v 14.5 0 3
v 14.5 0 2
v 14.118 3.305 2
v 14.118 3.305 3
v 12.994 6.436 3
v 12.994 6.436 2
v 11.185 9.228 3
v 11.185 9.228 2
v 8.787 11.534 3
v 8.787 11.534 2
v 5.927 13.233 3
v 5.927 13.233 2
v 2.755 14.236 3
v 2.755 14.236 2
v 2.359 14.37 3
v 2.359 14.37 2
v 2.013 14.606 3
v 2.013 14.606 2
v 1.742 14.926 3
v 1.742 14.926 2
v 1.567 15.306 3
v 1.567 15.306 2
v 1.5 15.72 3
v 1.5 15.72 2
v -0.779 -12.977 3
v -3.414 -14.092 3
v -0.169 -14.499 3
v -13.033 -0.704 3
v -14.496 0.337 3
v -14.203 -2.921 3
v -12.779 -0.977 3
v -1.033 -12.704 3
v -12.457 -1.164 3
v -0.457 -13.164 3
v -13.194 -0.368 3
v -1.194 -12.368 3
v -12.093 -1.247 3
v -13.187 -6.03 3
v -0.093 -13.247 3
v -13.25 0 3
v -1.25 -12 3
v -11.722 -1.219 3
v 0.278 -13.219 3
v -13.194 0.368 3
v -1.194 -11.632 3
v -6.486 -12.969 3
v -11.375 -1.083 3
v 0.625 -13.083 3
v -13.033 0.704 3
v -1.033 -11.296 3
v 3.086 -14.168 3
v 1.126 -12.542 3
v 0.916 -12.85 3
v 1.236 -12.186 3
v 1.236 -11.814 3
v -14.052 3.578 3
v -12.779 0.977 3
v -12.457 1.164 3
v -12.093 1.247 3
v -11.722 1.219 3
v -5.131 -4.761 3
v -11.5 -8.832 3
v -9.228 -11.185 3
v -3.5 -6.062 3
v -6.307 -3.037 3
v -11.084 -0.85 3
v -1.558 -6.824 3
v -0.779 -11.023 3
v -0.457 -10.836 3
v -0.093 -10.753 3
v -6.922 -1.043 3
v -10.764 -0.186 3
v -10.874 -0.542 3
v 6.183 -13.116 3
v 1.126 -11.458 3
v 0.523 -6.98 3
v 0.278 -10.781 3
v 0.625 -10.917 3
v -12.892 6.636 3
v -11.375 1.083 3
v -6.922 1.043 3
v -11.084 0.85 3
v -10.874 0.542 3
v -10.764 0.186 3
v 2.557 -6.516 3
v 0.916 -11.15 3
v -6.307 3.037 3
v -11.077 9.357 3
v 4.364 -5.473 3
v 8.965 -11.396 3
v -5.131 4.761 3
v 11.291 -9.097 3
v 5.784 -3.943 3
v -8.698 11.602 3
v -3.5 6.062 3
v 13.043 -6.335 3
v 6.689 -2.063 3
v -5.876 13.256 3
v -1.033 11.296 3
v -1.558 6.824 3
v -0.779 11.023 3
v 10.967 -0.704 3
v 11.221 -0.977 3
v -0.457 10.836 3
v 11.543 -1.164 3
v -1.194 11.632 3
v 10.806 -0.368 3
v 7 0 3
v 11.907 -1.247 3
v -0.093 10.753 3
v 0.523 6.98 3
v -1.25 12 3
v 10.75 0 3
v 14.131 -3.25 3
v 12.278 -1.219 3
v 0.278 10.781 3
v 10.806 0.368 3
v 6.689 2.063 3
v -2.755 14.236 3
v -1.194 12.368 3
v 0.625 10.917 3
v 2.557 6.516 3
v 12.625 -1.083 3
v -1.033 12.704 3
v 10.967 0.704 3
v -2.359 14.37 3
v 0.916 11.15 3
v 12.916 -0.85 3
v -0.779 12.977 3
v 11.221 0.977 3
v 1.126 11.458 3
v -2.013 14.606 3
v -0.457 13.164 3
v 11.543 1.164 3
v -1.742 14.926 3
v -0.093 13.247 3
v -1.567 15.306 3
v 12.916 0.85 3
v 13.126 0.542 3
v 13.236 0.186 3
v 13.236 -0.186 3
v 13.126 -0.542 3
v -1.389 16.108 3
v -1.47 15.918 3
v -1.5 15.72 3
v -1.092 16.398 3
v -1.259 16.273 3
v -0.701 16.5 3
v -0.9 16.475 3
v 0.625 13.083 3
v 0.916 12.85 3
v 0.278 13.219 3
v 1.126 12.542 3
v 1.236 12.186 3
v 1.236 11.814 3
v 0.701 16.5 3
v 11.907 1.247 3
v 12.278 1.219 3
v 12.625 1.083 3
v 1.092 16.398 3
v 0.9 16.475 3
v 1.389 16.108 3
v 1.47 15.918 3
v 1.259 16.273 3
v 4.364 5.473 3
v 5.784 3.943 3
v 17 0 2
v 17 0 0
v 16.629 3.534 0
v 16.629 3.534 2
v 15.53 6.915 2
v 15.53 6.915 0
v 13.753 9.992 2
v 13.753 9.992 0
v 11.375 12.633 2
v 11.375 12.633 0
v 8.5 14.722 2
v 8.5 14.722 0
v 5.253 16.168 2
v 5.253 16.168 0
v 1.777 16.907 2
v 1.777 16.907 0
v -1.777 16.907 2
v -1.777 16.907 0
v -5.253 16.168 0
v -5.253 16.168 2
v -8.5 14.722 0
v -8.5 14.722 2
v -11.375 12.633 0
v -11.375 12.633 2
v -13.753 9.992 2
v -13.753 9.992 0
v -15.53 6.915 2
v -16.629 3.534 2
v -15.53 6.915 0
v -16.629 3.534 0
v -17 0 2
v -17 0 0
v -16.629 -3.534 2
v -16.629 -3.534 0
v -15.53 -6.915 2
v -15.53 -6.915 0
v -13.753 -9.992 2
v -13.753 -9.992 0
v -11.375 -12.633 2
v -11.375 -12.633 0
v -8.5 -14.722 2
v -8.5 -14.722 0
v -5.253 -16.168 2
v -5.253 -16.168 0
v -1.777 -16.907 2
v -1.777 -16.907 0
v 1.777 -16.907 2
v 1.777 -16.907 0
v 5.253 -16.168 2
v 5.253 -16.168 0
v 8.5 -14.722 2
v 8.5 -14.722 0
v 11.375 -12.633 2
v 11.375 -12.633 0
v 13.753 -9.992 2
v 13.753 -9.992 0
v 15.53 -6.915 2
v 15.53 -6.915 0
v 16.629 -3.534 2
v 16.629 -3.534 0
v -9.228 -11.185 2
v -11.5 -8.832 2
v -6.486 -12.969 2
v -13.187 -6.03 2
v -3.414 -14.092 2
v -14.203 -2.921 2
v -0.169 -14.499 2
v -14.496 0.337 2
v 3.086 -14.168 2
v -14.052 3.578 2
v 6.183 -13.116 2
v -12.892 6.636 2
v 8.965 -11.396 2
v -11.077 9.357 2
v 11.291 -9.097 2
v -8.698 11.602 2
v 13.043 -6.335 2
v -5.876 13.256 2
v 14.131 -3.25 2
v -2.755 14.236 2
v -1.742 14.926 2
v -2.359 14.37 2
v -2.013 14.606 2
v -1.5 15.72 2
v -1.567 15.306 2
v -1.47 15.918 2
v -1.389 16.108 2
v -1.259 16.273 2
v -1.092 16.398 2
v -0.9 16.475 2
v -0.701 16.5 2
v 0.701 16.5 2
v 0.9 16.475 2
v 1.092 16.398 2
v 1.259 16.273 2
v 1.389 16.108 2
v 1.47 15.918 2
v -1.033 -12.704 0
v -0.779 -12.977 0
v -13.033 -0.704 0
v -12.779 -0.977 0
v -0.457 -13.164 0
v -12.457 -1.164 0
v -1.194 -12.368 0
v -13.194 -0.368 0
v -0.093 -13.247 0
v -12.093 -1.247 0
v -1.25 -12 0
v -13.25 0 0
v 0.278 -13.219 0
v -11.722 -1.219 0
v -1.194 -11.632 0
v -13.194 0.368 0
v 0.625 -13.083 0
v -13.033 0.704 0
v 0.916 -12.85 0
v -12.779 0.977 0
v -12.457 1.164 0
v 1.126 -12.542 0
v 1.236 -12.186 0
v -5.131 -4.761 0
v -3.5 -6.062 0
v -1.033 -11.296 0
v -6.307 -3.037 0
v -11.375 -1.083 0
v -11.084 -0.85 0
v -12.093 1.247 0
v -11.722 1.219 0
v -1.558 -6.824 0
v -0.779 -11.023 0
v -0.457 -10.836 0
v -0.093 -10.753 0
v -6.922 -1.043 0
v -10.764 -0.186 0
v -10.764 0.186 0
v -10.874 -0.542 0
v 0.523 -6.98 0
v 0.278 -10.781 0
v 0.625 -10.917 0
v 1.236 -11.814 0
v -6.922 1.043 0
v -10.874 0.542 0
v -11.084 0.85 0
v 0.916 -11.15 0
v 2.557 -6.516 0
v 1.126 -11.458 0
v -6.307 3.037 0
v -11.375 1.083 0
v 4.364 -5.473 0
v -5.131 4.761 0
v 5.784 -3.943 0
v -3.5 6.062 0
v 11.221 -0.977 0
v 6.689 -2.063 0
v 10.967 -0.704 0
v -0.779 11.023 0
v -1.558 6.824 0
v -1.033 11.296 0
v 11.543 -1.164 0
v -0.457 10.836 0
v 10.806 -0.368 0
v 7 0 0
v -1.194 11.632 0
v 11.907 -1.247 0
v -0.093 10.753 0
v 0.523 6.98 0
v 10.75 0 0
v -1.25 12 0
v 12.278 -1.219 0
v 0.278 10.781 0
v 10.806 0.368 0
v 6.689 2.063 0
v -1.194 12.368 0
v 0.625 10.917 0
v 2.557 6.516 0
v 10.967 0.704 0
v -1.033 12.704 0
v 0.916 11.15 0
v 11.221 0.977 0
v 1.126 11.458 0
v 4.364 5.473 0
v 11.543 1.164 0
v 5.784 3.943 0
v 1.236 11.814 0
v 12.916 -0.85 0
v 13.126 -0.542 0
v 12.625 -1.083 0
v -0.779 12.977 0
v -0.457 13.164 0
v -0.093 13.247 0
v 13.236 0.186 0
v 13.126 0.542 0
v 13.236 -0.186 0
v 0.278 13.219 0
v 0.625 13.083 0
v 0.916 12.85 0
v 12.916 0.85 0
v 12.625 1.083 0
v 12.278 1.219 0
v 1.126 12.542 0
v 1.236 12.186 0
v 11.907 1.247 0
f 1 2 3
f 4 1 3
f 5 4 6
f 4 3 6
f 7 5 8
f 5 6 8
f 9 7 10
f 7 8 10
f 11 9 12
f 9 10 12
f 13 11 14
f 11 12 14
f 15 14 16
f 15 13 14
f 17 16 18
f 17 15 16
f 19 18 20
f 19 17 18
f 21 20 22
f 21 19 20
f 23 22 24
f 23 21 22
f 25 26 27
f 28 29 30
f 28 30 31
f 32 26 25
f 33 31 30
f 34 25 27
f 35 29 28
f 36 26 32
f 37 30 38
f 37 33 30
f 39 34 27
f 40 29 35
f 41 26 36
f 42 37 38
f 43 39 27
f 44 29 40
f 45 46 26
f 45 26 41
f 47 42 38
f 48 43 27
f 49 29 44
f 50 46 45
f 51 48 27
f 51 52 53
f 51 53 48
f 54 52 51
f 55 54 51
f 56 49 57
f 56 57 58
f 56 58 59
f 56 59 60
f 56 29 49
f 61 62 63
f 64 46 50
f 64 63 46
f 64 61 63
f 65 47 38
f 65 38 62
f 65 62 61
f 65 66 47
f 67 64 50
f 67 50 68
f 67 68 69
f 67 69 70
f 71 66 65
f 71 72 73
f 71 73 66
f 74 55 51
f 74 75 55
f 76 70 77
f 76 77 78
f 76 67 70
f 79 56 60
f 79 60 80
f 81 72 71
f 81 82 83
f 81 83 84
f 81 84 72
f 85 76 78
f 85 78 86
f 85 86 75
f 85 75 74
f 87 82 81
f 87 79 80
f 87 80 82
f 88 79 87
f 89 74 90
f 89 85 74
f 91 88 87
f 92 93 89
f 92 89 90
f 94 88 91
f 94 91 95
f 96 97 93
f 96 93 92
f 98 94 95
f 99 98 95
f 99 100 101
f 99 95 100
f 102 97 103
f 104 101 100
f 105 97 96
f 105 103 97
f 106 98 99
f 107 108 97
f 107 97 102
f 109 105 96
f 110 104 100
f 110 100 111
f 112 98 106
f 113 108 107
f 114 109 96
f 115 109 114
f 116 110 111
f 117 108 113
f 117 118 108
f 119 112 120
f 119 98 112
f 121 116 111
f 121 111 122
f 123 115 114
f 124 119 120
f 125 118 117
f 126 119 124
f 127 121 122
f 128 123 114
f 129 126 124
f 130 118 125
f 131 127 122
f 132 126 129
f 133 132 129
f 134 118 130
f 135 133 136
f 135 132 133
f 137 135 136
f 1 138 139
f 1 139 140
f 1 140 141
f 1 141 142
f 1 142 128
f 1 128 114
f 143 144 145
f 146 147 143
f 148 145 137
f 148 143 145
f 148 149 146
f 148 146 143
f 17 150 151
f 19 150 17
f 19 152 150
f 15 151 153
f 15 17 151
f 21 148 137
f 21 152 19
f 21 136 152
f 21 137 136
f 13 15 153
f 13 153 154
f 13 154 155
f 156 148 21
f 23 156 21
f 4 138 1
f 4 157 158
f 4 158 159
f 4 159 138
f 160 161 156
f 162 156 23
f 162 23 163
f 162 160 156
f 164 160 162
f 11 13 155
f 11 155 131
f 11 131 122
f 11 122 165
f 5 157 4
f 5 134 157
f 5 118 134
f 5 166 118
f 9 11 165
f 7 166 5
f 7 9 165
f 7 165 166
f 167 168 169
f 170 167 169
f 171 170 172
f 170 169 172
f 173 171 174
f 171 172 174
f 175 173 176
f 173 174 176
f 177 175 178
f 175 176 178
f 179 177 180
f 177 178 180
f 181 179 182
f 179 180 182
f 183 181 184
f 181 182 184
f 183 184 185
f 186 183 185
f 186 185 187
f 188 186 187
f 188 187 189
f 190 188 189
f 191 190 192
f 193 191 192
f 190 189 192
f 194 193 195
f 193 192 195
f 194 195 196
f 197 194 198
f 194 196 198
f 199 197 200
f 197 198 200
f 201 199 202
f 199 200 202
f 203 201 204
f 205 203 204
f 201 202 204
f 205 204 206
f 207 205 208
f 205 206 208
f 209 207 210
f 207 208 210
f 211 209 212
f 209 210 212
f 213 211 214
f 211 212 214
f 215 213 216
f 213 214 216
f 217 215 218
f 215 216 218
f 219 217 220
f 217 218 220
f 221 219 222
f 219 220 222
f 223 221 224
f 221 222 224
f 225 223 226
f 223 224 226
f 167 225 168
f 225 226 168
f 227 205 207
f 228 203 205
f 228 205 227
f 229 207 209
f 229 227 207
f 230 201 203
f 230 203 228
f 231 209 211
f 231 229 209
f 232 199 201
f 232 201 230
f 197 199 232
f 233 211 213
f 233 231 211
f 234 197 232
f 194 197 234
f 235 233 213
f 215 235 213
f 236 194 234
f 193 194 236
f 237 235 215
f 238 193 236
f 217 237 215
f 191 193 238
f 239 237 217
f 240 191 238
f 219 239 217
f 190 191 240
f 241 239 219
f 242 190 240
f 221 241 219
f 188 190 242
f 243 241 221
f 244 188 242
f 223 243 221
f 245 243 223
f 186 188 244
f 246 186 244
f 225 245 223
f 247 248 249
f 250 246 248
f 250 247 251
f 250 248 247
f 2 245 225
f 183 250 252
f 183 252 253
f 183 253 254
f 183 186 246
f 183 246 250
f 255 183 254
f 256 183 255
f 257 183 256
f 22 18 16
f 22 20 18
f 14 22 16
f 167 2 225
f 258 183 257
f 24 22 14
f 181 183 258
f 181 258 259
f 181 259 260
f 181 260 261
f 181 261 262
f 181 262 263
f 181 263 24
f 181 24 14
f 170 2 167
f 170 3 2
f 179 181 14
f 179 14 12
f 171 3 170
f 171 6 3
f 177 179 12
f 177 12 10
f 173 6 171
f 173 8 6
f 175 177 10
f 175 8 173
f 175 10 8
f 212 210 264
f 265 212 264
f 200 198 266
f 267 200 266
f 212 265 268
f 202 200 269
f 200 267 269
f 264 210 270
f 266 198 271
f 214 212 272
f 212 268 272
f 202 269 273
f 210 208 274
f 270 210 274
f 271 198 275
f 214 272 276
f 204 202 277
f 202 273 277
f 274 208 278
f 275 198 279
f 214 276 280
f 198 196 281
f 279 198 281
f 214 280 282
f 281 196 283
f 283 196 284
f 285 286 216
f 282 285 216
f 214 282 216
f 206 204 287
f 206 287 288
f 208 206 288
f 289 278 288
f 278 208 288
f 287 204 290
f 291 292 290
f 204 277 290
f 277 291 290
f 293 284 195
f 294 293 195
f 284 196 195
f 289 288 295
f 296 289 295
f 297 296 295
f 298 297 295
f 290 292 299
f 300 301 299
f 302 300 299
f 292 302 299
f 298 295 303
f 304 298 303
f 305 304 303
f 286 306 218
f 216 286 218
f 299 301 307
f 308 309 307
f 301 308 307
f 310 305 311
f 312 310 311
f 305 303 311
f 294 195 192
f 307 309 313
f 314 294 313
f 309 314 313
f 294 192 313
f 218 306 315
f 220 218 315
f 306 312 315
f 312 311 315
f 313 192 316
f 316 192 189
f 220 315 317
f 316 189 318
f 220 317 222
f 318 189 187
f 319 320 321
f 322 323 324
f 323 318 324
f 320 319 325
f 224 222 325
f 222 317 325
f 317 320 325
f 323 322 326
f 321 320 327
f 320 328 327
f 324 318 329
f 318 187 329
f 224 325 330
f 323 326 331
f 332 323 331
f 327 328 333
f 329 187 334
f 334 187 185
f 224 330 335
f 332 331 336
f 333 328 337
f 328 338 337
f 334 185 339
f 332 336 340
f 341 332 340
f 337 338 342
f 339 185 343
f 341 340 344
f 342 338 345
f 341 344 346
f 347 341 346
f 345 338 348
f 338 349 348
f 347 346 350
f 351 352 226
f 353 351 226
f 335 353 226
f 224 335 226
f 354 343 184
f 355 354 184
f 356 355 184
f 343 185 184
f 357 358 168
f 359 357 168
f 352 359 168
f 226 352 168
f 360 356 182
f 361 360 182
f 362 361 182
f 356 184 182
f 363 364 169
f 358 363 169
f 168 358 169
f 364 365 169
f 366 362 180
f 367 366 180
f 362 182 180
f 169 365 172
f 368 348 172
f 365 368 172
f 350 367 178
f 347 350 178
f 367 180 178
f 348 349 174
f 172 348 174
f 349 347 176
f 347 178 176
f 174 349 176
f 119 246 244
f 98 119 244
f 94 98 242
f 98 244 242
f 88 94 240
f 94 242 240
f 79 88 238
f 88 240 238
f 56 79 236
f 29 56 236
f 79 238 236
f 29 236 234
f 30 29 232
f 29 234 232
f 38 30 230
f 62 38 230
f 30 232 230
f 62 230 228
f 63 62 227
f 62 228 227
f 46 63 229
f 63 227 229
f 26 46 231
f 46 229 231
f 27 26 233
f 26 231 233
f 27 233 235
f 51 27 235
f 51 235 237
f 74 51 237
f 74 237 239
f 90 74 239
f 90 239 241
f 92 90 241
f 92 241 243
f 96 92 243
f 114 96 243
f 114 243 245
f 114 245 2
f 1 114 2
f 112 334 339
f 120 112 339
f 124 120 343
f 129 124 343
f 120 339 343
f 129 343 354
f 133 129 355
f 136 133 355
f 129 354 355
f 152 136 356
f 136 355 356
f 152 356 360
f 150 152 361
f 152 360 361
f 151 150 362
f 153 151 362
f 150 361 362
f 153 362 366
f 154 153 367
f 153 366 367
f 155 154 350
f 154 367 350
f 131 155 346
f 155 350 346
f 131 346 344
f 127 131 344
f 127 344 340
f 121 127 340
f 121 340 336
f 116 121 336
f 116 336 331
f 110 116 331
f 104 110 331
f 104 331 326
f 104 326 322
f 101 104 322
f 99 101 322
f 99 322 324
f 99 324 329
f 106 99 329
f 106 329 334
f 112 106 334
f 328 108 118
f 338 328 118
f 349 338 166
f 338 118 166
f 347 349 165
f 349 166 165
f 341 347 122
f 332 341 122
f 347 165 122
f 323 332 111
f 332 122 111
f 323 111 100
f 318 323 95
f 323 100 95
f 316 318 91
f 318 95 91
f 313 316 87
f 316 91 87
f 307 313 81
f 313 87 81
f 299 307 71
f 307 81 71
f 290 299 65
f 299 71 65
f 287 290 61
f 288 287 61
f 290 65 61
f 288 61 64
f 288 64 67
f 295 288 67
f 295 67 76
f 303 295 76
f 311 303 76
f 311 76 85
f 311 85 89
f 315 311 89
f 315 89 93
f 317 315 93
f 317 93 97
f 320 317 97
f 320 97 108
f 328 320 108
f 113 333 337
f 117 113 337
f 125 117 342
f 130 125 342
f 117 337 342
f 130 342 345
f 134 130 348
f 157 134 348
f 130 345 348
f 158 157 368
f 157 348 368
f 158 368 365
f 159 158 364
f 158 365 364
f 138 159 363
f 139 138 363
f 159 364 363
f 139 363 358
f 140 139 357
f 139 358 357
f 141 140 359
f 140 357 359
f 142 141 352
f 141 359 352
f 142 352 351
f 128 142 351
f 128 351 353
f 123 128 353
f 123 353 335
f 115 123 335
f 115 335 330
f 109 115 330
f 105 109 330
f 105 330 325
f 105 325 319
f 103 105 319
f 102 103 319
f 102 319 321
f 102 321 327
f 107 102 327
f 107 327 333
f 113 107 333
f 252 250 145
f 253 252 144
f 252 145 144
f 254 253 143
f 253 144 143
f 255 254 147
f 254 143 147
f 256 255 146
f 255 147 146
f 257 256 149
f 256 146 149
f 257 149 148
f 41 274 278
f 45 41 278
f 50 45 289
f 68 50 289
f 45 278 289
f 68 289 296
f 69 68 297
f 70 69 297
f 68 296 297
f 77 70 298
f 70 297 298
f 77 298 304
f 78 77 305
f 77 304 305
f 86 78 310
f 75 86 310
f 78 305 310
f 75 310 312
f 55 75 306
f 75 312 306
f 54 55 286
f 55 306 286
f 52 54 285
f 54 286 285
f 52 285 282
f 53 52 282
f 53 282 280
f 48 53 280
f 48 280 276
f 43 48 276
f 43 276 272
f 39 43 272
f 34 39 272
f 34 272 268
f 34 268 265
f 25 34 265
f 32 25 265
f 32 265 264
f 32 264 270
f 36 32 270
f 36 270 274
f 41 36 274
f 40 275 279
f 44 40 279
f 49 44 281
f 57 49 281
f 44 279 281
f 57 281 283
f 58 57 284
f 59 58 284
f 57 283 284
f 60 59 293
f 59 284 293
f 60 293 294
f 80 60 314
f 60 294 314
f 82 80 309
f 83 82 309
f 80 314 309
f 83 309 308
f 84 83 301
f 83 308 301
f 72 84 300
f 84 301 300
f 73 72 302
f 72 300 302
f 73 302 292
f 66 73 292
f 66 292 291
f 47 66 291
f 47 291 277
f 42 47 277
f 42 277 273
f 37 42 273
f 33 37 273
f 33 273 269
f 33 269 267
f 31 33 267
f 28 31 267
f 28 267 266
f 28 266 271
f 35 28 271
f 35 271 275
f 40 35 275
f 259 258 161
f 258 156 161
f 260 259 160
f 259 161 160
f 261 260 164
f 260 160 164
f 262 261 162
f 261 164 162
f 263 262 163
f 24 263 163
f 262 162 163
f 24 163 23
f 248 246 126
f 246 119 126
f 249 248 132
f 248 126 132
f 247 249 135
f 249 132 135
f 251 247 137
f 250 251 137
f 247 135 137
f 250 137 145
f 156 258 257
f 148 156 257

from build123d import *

# Parameters (mm, degrees)
SKETCH_1_R          = 17
EXTRUDE_1_DEPTH     = 2
EXTRUDE_2_DEPTH     = 1
FILLET_1_R          = 1.55
FILLET_2_R          = 0.8
SKETCH_3_R          = 7
CUT_EXTRUDE_1_DEPTH = 4
SKETCH_4_R          = 1.25
CUT_EXTRUDE_2_DEPTH = 4.0000001


with BuildPart() as part:
    # ｽｹｯﾁ1 → ﾎﾞｽ - 押し出し1 (new body)
    with BuildSketch(Plane.XY):
        Circle(SKETCH_1_R)
    extrude(amount=EXTRUDE_1_DEPTH)

    # ｽｹｯﾁ2 → ﾎﾞｽ - 押し出し2 (add)
    with BuildSketch(Plane.XY.offset(2)):
        with BuildLine():
            Line((-1.5, 14.422205102), (-1.5, 12.5))
            Line((-1.5, 12.5), (1.5, 12.5))
            Line((1.5, 12.5), (1.5, 14.422205102))
            ThreePointArc((1.5, 14.422205102), (0, 14.5), (-1.5, 14.422205102))
        make_face()
        with BuildLine():
            Line((1.5, 12.5), (-1.5, 12.5))
            Line((-1.5, 12.5), (-1.5, 14.422205102))
            ThreePointArc((-1.5, 14.422205102), (-9.708243919, -10.770329614), (14.5, 0))
            ThreePointArc((14.5, 0), (10.770329614, 9.708243919), (1.5, 14.422205102))
            Line((1.5, 14.422205102), (1.5, 12.5))
        make_face()
        with BuildLine():
            Line((-1.5, 16.5), (-1.5, 14.422205102))
            ThreePointArc((-1.5, 14.422205102), (0, 14.5), (1.5, 14.422205102))
            Line((1.5, 14.422205102), (1.5, 16.5))
            Line((1.5, 16.5), (-1.5, 16.5))
        make_face()
    extrude(amount=EXTRUDE_2_DEPTH)

    # ﾌｨﾚｯﾄ1
    fillet_1_edges = [part.edges().sort_by_distance(p)[0] for p in [
        (-1.5, 14.422205102, 2.5),
        (1.5, 14.422205102, 2.5),
    ]]
    fillet(fillet_1_edges, radius=FILLET_1_R)

    # ﾌｨﾚｯﾄ2
    fillet_2_edges = [part.edges().sort_by_distance(p)[0] for p in [
        (1.5, 16.5, 2.5),
        (-1.5, 16.5, 2.5),
    ]]
    fillet(fillet_2_edges, radius=FILLET_2_R)

    # ｽｹｯﾁ3 → ｶｯﾄ - 押し出し1 (cut, through all)
    with BuildSketch(Plane.XY.offset(3)):
        Circle(SKETCH_3_R)
    extrude(amount=-CUT_EXTRUDE_1_DEPTH, mode=Mode.SUBTRACT)

    # ｽｹｯﾁ4 → ｶｯﾄ - 押し出し2 (cut, through all)
    with BuildSketch(Plane(origin=(0, 0, 0), x_dir=(-1, 0, 0), z_dir=(0, 0, -1))):
        with Locations((0, 12)):
            Circle(SKETCH_4_R)
        with Locations((12, 0)):
            Circle(SKETCH_4_R)
        with Locations((0, -12)):
            Circle(SKETCH_4_R)
        with Locations((-12, 0)):
            Circle(SKETCH_4_R)
    extrude(amount=-CUT_EXTRUDE_2_DEPTH, mode=Mode.SUBTRACT)


solid = part.part
